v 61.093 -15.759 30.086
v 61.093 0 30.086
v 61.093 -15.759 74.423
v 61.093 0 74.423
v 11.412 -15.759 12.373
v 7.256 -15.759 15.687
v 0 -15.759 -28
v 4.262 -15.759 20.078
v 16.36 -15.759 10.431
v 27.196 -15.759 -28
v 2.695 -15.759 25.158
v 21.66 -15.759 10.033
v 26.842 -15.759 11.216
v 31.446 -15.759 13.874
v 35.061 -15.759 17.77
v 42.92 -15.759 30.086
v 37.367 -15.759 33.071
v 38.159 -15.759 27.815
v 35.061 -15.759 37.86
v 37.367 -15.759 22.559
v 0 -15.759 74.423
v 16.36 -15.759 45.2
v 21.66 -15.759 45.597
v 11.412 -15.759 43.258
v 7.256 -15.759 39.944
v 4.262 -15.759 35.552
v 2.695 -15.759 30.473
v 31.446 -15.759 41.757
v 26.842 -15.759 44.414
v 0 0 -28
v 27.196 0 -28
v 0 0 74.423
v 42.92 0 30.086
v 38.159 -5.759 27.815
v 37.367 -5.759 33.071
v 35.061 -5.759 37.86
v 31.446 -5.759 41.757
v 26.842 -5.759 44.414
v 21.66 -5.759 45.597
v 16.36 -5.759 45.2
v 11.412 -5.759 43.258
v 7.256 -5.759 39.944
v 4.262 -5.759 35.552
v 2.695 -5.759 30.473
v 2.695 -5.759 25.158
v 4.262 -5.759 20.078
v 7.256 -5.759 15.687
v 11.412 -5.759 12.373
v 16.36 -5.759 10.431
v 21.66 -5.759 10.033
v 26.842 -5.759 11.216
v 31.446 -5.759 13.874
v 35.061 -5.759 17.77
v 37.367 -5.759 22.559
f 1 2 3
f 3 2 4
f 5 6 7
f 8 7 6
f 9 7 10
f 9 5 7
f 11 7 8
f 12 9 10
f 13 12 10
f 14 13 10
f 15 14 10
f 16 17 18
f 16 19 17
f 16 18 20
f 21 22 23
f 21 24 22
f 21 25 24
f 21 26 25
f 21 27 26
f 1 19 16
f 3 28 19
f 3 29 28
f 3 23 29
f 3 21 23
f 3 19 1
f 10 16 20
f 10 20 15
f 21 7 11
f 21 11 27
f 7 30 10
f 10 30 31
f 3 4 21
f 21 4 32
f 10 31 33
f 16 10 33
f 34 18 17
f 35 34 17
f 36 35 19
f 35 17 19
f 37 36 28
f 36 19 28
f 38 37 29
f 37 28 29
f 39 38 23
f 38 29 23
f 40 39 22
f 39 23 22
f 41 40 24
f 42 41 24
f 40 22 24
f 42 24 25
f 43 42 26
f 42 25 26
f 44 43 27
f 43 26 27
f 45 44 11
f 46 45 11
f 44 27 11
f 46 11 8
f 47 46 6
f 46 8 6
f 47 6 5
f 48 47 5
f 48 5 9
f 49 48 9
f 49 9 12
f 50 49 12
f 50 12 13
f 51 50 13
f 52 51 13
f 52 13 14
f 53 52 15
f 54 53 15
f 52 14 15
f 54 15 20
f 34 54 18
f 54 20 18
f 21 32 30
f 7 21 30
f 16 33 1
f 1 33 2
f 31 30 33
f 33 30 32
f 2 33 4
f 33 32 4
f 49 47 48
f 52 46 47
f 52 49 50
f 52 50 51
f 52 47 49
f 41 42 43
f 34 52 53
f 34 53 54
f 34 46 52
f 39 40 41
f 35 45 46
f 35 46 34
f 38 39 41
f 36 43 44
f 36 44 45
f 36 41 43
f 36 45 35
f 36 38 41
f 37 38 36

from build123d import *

# Parameters (mm, degrees)
F1_DEPTH = 15.759194
F2_R     = 17.831749
F3_DEPTH = 10


with BuildPart() as f1:
    # F0 (on Front) → F1 (new body)
    with BuildSketch(Plane.XZ):
        Polygon((0, -28.000414), (27.195573, -28.000414), (42.920023, 30.085534), (61.09336, 30.085534), (61.09336, 74.423328), (0, 74.423328), align=None)
    extrude(amount=F1_DEPTH)

    # F2 (on face) → F3 (cut)
    with BuildSketch(Plane.XZ.offset(15.759194)):
        with Locations((20.327643, 27.81529)):
            Circle(F2_R)
    extrude(amount=-F3_DEPTH, mode=Mode.SUBTRACT)


solid = f1.part
